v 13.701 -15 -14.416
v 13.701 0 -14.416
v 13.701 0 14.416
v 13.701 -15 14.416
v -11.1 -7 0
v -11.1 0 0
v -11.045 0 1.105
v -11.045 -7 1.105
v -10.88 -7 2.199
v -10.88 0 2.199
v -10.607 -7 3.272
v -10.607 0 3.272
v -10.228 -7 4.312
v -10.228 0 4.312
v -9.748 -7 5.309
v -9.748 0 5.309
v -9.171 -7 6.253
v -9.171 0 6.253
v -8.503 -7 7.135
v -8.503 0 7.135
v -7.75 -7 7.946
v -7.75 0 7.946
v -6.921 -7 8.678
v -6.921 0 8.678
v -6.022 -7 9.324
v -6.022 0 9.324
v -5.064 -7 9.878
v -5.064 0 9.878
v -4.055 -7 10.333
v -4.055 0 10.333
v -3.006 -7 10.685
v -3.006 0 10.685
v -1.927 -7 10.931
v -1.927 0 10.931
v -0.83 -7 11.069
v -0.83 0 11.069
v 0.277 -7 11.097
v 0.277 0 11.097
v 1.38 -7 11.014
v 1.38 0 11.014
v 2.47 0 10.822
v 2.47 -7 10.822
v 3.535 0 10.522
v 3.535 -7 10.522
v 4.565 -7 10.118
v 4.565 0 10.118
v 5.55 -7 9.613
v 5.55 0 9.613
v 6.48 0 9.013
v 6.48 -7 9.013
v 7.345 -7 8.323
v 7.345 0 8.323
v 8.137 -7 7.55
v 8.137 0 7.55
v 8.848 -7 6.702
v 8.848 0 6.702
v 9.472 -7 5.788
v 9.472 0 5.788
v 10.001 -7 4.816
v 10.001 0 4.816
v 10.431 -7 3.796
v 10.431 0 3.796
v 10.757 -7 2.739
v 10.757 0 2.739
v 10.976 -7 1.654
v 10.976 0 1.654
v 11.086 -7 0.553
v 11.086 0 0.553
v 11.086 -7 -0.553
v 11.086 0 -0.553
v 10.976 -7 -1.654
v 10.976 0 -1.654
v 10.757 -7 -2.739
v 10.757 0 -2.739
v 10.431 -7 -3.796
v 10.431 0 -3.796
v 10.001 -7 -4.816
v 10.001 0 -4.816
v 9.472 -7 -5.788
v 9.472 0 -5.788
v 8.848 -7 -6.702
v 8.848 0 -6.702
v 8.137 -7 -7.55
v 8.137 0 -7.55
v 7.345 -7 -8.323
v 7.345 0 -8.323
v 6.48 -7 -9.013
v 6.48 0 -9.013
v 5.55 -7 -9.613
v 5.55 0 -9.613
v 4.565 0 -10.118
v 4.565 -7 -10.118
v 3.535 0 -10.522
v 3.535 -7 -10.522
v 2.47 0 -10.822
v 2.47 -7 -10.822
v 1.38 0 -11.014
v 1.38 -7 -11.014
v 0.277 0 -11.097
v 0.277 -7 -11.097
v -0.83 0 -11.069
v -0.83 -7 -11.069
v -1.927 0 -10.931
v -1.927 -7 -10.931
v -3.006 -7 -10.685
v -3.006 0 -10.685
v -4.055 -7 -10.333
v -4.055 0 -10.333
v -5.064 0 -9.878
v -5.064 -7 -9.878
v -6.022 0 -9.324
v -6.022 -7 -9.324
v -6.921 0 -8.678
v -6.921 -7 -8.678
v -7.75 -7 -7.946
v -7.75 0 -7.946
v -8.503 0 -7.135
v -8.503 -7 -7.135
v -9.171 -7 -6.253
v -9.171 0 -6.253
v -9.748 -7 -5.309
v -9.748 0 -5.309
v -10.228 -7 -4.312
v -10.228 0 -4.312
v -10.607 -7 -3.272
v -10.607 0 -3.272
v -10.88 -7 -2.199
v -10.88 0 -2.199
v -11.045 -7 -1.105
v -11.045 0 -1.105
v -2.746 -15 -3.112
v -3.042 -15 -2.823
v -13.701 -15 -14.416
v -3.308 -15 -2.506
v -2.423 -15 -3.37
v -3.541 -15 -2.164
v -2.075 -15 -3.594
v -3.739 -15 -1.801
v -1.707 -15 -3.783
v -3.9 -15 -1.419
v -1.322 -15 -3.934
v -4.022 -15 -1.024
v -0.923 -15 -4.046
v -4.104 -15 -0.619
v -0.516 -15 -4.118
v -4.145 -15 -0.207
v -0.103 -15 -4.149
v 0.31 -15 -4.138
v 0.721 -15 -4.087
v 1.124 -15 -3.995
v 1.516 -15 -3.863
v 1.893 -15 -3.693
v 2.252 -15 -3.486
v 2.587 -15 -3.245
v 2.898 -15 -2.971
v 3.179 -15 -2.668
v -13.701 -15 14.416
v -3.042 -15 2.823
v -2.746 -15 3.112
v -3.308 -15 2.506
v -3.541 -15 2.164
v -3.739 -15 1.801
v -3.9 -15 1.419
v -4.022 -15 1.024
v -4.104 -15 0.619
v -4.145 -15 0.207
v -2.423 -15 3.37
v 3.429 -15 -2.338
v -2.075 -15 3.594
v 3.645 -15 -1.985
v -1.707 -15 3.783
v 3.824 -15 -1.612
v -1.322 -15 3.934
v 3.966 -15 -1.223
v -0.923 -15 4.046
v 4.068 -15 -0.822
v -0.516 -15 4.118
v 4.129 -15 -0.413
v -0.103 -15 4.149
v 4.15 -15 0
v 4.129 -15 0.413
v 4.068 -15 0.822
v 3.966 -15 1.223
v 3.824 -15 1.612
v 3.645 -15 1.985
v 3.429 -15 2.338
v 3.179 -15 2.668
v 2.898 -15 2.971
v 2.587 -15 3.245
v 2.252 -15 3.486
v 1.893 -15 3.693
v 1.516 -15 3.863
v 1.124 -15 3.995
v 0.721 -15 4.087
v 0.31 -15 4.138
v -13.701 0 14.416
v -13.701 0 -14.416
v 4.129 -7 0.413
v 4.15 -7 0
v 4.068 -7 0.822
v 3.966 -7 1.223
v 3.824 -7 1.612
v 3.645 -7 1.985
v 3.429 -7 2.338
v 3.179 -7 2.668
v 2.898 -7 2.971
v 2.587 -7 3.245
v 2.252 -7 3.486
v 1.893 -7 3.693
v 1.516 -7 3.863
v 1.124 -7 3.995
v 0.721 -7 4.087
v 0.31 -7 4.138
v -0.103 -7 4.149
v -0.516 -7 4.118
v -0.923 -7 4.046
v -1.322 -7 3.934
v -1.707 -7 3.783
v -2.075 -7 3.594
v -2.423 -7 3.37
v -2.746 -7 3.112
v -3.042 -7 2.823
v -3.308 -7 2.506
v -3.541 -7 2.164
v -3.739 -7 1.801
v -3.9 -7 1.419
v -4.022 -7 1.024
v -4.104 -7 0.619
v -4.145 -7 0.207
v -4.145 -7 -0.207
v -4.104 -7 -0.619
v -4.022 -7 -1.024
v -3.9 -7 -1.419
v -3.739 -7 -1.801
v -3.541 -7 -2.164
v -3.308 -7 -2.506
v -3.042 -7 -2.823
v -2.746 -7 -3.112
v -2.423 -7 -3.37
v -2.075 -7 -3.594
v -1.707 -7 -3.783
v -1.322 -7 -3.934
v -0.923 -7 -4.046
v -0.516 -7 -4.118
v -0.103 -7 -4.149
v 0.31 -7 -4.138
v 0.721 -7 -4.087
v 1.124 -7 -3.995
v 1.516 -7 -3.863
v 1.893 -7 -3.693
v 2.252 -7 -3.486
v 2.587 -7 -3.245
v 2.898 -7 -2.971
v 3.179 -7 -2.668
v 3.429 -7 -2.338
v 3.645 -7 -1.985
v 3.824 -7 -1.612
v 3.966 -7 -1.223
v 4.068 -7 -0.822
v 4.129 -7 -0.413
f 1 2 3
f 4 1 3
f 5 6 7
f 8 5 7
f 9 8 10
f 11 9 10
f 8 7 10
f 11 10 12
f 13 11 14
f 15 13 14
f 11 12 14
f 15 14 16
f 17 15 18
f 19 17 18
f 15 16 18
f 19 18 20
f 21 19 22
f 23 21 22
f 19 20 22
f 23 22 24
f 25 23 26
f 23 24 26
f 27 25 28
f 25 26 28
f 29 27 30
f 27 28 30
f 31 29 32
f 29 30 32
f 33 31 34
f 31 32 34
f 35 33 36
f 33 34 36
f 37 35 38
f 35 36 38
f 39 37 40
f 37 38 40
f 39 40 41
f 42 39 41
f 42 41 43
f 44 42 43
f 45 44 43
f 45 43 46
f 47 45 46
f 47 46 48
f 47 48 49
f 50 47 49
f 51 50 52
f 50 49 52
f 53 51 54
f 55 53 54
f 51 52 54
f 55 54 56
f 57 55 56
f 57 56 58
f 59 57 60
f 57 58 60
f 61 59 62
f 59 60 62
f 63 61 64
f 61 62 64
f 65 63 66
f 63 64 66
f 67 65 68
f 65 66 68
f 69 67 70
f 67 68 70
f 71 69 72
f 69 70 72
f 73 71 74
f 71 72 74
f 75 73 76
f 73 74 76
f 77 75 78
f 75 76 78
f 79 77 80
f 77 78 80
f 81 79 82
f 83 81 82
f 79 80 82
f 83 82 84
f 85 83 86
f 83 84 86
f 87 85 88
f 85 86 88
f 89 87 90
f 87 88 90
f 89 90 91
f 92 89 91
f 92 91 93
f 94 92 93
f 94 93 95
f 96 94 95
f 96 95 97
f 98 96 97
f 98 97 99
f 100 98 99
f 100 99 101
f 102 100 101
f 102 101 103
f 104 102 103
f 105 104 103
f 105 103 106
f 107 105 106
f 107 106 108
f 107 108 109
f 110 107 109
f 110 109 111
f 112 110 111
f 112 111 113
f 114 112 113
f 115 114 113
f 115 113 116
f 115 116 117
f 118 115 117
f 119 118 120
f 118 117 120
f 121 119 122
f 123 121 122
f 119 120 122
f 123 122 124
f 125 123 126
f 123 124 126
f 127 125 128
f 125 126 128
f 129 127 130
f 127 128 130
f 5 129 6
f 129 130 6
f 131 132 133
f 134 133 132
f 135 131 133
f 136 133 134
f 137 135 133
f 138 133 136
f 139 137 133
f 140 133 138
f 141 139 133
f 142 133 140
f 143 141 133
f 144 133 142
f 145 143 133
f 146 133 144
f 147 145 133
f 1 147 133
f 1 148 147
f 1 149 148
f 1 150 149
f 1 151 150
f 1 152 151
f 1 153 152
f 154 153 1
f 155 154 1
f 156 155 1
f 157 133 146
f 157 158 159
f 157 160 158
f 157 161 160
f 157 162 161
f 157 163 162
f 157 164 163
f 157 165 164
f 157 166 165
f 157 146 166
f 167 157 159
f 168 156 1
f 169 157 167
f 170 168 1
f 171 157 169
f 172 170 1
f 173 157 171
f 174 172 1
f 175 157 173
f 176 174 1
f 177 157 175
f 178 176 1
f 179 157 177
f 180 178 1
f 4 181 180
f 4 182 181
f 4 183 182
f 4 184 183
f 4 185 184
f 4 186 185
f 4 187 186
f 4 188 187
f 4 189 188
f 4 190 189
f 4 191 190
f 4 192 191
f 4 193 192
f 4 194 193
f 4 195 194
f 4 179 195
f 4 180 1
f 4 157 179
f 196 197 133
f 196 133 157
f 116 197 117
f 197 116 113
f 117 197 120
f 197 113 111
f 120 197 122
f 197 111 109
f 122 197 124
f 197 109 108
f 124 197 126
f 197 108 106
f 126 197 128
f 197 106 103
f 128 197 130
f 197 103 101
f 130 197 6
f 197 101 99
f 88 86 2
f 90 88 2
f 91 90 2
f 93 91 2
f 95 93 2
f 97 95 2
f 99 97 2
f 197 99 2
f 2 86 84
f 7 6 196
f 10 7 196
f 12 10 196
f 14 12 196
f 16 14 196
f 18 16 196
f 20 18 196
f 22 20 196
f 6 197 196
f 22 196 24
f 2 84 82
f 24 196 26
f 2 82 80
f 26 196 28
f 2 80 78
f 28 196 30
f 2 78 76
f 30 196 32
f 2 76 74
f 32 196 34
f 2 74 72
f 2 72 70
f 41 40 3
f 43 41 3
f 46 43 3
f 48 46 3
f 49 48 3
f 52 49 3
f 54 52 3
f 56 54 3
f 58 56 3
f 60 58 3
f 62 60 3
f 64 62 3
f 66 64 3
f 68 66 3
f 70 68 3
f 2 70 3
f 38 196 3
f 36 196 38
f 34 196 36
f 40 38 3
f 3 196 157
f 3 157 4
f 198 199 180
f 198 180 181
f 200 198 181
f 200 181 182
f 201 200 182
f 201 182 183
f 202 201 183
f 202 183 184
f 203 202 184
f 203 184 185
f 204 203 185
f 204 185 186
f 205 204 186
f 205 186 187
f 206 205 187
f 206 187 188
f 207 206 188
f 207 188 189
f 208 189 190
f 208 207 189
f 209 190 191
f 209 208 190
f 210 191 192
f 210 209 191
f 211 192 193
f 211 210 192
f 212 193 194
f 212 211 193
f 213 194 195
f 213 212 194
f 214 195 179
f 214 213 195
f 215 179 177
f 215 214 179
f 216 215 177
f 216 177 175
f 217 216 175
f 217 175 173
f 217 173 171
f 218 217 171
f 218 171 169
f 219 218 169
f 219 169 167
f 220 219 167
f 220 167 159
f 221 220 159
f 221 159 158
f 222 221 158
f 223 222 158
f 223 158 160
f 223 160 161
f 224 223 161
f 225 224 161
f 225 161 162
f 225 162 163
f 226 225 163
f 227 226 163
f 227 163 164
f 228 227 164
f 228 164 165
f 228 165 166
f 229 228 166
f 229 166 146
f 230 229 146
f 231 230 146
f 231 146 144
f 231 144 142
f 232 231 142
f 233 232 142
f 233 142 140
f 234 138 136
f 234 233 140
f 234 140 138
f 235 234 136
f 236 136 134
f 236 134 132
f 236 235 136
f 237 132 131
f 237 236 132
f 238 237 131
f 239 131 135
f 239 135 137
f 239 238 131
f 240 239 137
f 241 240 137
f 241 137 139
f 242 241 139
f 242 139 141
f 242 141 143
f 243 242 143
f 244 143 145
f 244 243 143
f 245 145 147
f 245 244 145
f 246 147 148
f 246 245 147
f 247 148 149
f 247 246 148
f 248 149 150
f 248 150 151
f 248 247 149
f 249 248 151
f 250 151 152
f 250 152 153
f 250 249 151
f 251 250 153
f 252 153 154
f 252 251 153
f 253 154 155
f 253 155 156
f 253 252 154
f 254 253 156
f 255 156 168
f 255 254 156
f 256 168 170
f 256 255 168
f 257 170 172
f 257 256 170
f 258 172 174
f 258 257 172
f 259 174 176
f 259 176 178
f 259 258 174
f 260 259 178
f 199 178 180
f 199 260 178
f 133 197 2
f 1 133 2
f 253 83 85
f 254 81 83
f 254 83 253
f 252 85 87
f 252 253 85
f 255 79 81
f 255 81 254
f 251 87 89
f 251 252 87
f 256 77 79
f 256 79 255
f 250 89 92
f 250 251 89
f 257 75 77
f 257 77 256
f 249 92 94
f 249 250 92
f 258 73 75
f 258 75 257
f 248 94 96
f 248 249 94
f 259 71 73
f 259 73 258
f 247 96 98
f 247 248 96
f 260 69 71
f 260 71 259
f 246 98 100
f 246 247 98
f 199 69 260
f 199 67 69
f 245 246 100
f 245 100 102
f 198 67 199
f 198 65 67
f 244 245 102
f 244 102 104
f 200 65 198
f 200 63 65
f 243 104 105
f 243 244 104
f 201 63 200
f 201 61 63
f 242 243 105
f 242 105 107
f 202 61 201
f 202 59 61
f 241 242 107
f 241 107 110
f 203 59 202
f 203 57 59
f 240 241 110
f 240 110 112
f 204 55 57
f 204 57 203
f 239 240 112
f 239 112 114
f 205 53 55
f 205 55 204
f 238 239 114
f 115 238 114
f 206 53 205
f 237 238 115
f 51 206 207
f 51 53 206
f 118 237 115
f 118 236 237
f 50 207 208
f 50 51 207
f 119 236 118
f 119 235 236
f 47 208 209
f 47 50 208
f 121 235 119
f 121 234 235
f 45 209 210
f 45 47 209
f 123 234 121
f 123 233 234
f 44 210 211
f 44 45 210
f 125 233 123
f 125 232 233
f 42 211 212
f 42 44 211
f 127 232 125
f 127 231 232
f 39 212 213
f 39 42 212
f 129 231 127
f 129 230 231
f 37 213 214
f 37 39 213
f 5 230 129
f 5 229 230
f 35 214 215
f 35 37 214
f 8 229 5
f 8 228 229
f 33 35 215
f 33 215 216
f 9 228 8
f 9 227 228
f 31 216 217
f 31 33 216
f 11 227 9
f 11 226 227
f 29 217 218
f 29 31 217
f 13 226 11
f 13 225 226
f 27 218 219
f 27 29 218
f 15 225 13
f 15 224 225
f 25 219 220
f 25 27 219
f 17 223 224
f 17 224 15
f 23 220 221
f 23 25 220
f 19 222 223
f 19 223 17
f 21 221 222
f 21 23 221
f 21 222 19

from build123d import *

# Parameters (mm, degrees)
F0_W     = 27.401832
F0_H     = 28.832448
F0_R     = 11.1
F0_R_2   = 4.15
F1_DEPTH = 15
F2_R     = 11.1
F2_R_2   = 4.15
F3_DEPTH = 7


with BuildPart() as f1:
    # F0 (on Front) → F1 (new body)
    with BuildSketch(Plane.XZ):
        Rectangle(F0_W, F0_H)
        Circle(F0_R, mode=Mode.SUBTRACT)
        Circle(F0_R)
        Circle(F0_R_2, mode=Mode.SUBTRACT)
    extrude(amount=F1_DEPTH)

    # F2 (on face) → F3 (cut)
    with BuildSketch(Plane(origin=(0, 0, 0), x_dir=(-1, 0, 0), z_dir=(0, 1, 0))):
        Circle(F2_R)
        Circle(F2_R_2, mode=Mode.SUBTRACT)
    extrude(amount=-F3_DEPTH, mode=Mode.SUBTRACT)


solid = f1.part
